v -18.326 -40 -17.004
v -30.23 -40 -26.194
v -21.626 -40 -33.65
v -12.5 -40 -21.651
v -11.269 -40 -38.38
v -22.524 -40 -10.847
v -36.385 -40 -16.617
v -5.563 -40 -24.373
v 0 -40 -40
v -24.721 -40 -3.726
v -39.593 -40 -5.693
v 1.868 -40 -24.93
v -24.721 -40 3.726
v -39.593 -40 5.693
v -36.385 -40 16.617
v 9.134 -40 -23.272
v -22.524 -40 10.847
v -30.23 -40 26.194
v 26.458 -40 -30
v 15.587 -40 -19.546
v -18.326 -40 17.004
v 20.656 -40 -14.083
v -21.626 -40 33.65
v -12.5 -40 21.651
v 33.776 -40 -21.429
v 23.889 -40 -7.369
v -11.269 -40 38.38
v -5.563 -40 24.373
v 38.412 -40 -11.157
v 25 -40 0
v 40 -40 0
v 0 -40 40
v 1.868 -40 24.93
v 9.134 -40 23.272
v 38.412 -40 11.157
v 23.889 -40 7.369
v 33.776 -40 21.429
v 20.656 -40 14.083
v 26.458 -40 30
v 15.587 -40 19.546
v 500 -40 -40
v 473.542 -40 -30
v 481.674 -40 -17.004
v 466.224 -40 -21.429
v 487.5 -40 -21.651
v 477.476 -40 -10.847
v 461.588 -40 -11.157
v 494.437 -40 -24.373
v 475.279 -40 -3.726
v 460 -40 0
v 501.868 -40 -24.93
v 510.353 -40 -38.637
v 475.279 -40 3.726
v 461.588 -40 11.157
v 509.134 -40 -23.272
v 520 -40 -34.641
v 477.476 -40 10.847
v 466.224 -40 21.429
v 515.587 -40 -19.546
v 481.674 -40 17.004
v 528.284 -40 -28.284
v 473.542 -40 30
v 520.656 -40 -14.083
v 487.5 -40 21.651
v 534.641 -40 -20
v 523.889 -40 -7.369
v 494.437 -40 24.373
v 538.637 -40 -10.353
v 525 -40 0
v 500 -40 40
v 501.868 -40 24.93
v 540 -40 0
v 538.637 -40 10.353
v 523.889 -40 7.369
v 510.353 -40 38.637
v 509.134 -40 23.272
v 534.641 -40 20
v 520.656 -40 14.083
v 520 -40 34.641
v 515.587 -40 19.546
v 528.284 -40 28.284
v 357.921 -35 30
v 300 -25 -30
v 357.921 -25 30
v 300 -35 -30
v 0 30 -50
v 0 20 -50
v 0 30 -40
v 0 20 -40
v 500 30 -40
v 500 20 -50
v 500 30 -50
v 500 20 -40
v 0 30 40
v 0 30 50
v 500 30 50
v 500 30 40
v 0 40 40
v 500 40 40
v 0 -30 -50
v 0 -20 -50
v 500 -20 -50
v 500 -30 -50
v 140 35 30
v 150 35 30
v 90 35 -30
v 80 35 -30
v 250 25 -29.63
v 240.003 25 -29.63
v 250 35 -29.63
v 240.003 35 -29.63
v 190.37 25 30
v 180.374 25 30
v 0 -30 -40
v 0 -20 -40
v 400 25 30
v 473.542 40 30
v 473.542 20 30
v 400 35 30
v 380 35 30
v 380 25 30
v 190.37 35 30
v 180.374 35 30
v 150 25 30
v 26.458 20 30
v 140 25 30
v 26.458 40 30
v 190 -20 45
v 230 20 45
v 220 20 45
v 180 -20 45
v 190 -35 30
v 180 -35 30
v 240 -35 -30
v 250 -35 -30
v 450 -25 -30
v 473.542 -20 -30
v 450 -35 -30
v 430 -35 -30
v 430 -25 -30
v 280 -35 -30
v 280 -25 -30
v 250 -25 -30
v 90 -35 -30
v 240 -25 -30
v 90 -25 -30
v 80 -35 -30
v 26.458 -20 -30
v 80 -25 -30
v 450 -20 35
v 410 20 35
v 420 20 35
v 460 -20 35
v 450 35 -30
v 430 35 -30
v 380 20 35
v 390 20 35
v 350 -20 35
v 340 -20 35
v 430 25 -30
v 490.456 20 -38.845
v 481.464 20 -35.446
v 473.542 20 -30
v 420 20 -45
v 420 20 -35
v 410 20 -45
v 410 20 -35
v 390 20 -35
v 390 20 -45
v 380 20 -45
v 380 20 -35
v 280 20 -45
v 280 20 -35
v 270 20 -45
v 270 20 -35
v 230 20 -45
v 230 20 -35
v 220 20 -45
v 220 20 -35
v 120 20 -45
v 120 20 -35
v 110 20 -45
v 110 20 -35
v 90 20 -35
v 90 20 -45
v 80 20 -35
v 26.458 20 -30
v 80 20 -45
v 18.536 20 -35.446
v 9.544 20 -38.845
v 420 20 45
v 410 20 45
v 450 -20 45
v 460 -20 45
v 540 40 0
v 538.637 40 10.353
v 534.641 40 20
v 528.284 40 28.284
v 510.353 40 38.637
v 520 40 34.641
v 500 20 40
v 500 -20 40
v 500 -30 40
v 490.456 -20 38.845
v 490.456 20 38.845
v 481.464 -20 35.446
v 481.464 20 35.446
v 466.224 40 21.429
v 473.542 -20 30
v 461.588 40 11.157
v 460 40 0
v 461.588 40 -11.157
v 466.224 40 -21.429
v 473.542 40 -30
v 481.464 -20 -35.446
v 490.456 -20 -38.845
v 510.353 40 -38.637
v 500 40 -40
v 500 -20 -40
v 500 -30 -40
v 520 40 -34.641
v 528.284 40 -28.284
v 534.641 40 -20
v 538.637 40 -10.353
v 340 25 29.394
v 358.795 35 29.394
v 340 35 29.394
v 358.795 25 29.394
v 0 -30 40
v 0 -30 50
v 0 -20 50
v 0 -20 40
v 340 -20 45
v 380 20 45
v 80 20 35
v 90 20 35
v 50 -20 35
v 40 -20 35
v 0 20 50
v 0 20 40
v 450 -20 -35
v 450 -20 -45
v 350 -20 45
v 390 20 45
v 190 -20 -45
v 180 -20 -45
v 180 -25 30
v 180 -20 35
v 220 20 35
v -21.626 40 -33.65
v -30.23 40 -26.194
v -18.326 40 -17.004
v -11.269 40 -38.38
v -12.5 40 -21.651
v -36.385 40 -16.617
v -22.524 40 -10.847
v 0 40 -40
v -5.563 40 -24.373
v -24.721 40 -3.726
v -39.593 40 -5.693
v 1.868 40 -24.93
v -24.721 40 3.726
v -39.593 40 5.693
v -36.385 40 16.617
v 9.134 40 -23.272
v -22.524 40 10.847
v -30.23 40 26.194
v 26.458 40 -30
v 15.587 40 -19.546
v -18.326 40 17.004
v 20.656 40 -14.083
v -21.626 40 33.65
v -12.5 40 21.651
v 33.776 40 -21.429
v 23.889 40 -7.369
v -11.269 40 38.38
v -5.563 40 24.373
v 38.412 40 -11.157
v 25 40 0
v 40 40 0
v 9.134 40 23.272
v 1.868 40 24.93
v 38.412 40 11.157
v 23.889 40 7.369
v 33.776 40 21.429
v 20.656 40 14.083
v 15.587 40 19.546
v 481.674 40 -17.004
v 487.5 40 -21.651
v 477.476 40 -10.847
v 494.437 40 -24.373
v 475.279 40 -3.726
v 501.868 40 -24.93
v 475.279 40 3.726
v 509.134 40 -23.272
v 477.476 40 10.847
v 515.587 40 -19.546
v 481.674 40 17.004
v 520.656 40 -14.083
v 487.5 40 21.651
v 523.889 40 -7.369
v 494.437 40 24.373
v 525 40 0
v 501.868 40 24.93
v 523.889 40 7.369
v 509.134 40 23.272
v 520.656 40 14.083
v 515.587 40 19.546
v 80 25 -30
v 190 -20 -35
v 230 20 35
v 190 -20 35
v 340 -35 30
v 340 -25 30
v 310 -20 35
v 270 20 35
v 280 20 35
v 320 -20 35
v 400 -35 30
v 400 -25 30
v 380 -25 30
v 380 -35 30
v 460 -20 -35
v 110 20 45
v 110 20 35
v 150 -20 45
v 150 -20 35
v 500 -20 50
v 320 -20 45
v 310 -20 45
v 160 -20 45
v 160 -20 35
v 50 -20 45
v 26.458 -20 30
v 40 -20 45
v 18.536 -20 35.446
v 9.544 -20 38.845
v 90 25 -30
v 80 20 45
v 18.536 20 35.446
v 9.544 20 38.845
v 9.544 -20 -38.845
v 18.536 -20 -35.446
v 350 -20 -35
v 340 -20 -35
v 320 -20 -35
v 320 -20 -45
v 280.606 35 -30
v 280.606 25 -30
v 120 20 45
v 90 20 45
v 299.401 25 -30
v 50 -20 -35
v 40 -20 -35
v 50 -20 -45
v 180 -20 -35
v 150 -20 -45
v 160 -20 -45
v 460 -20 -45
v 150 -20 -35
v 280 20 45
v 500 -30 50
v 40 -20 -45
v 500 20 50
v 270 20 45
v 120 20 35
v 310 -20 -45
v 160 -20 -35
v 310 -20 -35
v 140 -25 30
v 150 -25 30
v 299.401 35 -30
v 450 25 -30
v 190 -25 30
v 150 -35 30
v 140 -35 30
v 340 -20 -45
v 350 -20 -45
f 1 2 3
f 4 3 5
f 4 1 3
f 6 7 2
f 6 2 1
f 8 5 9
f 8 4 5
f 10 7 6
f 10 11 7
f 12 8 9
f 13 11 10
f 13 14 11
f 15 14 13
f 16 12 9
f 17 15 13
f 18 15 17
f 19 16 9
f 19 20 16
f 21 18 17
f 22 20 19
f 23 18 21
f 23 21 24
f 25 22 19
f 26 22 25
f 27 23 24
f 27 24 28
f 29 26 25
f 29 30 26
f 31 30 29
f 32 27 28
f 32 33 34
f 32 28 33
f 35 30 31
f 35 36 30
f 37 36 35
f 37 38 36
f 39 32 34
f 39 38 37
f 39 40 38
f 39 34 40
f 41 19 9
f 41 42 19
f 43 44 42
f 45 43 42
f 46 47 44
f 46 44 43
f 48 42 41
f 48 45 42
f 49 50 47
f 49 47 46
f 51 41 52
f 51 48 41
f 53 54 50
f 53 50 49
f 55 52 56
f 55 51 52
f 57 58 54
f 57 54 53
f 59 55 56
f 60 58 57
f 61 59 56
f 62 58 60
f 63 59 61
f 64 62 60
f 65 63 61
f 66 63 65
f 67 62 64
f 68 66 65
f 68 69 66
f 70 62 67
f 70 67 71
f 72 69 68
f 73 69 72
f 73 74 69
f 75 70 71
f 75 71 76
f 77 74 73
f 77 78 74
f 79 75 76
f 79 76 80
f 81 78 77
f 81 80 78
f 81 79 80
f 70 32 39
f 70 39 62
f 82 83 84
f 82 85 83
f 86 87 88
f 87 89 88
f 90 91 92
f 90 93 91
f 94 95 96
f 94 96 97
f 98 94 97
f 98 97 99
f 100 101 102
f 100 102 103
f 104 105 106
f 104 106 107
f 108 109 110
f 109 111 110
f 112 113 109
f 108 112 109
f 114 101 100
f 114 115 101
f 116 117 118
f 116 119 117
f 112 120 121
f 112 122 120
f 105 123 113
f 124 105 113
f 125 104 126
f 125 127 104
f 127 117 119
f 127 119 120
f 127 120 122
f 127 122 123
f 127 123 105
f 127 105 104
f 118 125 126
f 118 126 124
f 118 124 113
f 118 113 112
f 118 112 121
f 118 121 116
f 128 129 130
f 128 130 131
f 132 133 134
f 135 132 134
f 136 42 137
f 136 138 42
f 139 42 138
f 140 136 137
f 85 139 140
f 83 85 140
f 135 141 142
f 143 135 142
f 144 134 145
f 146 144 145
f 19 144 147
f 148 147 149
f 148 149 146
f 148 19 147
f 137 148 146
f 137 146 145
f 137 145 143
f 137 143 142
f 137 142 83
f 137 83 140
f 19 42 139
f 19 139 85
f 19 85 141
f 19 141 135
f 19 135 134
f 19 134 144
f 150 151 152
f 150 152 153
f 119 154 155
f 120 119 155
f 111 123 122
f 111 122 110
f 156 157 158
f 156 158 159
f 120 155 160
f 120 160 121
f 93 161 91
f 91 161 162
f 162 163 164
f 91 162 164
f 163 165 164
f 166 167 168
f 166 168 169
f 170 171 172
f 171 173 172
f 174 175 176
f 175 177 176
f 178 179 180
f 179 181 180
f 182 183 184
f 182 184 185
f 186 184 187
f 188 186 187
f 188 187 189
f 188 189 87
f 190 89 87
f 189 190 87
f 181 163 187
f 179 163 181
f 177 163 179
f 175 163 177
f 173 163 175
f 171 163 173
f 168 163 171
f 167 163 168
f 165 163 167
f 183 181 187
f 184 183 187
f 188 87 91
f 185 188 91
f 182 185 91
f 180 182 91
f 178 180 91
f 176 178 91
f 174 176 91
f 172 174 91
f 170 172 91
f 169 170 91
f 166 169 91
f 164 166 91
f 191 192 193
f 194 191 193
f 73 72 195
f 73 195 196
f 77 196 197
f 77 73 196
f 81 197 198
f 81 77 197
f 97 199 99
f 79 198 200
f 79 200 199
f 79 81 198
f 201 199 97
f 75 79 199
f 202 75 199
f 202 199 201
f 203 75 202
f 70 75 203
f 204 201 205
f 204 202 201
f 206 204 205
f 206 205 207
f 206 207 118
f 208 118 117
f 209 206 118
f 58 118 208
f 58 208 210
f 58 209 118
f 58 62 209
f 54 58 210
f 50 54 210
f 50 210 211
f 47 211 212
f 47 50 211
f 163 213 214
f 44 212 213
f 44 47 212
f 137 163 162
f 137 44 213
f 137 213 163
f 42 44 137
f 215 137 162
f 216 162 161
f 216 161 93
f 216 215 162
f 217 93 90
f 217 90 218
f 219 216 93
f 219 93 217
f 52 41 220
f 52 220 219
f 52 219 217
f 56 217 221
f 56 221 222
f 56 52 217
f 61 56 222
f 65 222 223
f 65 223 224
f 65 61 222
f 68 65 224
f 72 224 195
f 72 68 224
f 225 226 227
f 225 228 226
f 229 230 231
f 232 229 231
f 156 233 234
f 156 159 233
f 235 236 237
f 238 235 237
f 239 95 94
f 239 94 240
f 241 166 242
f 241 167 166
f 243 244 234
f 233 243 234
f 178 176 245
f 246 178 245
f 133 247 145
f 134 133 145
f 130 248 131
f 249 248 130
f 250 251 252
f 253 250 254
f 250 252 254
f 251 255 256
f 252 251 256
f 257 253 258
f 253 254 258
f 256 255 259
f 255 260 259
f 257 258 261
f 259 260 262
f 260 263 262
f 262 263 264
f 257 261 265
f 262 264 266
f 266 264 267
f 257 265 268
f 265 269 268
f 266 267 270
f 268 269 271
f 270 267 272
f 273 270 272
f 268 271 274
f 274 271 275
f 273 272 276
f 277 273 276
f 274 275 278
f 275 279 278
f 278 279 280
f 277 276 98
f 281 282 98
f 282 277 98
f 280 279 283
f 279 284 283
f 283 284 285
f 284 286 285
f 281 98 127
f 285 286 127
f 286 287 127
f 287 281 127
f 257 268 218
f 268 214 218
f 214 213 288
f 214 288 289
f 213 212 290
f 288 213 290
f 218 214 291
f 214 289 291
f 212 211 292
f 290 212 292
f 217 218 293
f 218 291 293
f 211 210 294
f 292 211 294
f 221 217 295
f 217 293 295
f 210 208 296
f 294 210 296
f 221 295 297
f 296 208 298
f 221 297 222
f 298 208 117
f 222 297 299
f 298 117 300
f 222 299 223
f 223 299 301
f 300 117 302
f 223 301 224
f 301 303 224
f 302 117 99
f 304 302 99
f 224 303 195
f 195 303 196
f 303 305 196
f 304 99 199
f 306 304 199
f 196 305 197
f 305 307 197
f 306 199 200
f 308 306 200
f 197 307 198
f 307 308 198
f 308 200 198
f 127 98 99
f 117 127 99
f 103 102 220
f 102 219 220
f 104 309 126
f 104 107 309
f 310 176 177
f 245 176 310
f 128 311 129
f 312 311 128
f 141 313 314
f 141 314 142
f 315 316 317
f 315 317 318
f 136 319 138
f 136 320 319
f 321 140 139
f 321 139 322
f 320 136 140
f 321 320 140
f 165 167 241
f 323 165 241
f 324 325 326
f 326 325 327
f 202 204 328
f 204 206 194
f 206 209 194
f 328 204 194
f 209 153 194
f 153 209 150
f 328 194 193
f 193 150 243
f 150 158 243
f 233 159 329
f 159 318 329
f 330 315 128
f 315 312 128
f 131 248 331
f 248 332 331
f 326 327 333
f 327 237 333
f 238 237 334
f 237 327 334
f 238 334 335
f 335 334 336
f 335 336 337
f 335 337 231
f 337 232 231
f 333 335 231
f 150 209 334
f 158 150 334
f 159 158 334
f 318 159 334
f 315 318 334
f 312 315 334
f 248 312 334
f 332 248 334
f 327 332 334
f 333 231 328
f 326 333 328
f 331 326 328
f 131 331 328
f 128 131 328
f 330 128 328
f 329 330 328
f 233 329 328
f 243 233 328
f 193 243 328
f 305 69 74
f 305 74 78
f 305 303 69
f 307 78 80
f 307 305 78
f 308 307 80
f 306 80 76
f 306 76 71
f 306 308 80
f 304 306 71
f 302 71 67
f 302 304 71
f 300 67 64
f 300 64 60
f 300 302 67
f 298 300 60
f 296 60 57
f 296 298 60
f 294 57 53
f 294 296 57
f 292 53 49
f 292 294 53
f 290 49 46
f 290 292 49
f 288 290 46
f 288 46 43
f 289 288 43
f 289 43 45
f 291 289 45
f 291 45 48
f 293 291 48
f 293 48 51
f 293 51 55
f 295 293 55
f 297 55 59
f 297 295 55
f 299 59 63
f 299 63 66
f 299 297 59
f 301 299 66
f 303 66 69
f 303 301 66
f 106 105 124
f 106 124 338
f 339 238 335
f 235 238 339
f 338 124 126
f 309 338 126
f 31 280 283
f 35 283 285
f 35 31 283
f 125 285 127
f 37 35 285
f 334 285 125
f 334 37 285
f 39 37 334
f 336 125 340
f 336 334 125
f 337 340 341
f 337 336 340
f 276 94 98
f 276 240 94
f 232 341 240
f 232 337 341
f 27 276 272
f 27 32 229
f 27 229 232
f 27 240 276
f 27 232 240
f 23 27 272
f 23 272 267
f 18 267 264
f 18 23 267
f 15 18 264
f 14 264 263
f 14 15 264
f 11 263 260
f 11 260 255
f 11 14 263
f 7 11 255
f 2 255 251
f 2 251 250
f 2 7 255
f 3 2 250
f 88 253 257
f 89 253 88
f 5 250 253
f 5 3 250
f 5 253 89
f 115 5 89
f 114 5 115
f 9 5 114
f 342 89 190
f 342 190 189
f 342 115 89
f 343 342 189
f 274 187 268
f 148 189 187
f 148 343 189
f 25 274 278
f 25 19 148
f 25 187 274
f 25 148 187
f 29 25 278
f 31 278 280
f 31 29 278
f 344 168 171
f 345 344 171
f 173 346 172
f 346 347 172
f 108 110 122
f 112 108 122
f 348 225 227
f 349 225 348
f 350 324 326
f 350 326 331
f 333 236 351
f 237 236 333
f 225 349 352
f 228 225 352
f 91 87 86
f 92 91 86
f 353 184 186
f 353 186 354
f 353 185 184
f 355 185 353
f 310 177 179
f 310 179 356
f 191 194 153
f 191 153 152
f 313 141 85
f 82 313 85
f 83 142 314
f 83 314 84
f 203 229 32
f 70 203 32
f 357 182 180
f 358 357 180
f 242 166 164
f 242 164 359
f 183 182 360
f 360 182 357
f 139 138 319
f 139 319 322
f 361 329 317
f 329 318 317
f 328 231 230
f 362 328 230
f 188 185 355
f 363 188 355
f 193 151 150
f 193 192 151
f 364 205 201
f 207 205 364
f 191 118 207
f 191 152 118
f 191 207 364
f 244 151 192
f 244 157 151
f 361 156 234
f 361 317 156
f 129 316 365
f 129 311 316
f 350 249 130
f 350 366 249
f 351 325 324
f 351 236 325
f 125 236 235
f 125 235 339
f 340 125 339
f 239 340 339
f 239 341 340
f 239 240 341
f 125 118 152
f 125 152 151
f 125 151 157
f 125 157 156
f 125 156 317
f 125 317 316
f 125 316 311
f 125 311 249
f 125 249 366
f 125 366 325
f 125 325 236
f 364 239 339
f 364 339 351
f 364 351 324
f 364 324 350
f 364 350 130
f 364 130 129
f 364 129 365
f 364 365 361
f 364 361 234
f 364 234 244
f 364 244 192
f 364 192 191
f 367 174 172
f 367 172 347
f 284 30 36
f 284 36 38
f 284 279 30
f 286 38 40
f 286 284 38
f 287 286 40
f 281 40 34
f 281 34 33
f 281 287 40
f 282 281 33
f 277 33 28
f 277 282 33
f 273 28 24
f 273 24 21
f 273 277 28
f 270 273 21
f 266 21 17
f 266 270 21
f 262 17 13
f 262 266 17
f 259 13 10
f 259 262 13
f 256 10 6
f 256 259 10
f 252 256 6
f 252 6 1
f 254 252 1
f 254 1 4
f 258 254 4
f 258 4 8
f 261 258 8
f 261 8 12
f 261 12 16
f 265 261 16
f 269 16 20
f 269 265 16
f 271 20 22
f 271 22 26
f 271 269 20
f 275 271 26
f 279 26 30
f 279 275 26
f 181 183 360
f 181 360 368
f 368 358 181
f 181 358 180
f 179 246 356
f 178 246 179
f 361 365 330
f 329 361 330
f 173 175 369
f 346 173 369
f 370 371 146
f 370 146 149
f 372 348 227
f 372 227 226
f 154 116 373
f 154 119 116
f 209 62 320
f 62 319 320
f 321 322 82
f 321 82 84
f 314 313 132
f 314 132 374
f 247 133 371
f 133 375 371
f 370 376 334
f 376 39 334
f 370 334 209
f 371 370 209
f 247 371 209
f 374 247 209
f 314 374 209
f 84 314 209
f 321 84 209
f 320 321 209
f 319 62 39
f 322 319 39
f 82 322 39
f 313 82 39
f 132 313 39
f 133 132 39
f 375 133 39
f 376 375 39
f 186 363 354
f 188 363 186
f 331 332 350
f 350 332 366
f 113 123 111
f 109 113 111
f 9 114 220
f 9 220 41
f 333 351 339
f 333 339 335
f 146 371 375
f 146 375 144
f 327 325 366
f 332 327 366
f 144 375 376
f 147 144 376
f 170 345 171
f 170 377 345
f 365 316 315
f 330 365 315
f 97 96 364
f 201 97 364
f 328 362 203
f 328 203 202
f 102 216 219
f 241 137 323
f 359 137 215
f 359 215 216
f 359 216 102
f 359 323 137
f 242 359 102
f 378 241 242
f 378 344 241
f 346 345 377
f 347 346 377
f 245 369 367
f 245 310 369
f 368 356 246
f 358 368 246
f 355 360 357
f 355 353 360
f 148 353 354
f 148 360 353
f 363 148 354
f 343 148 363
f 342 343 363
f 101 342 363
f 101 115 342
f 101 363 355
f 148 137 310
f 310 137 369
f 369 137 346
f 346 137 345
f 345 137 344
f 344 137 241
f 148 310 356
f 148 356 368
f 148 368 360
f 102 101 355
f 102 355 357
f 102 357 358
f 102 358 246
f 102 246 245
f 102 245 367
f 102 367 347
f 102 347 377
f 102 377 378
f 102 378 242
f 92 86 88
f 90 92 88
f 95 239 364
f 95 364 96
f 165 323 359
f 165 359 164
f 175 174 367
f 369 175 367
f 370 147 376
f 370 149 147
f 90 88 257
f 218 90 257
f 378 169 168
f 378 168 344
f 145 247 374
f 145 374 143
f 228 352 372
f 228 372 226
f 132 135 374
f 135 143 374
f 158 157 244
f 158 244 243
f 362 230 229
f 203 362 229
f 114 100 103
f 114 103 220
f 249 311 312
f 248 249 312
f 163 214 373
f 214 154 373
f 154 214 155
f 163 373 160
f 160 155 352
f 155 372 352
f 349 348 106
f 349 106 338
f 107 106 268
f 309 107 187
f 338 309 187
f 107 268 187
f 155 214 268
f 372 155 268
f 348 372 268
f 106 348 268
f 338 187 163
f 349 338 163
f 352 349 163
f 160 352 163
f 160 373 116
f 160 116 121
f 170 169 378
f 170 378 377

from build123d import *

# Parameters (mm, degrees)
SKETCH_R      = 40
SKETCH_R_2    = 25
PAD_DEPTH     = 40
PAD001_DEPTH  = 500
SKETCH002_R   = 40
SKETCH002_R_2 = 25
PAD002_DEPTH  = 40
PAD003_DEPTH  = 5
PAD004_DEPTH  = 5
PAD005_DEPTH  = 5
PAD006_DEPTH  = 5


with BuildPart() as part:
    # Sketch → Pad (new body, symmetric)
    with BuildSketch(Plane.XZ):
        Circle(SKETCH_R)
        Circle(SKETCH_R_2, mode=Mode.SUBTRACT)
    extrude(amount=PAD_DEPTH, both=True)

    # Sketch001 → Pad001 (join)
    with BuildSketch(Plane.YZ):
        Polygon((-30, 50), (-30, 40), (-40, 40), (-40, 30), (-20, 30), (-20, 50), align=None)
        Polygon((30, 50), (30, 40), (40, 40), (40, 30), (20, 30), (20, 50), align=None)
        Polygon((-30, -50), (-30, -40), (-40, -40), (-40, -30), (-20, -30), (-20, -50), align=None)
        Polygon((30, -50), (30, -40), (40, -40), (40, -30), (20, -30), (20, -50), align=None)
    extrude(amount=PAD001_DEPTH)

    # Sketch002 → Pad002 (join, symmetric)
    with BuildSketch(Plane(origin=(500, 0, 0), x_dir=(1, 0, 0), z_dir=(0, -1, 0))):
        Circle(SKETCH002_R)
        Circle(SKETCH002_R_2, mode=Mode.SUBTRACT)
    extrude(amount=PAD002_DEPTH, both=True)

    # Sketch004 → Pad003 (join, symmetric)
    with BuildSketch(Plane.XZ.offset(-30)):
        Polygon((80, -30), (140, 30), (150, 30), (90, -30), align=None)
        Polygon((450, -30), (430, -30), (380, 30), (400, 30), align=None)
        Polygon((180.003479, 30.370306), (240.003479, -29.629694), (250, -29.629694), (190, 30.370306), align=None)
        Polygon((358.794617, 29.393638), (340, 29.393638), (280, -30.606362), (298.794617, -30.606362), align=None)
    extrude(amount=PAD003_DEPTH, both=True)

    # Sketch003 → Pad004 (join, symmetric)
    with BuildSketch(Plane.XZ.offset(30)):
        Polygon((80, -30), (140, 30), (150, 30), (90, -30), align=None)
        Polygon((450, -30), (430, -30), (380, 30), (400, 30), align=None)
        Polygon((180, 30), (240, -30), (250, -30), (190, 30), align=None)
        Polygon((357.920776, 30), (340, 30), (280, -30), (300, -30), align=None)
    extrude(amount=PAD004_DEPTH, both=True)

    # Sketch006 → Pad005 (join, symmetric)
    with BuildSketch(Plane.XY.offset(-40)):
        Polygon((230, 20), (190, -20), (180, -20), (220, 20), align=None)
        Polygon((160, -20), (120, 20), (110, 20), (150, -20), align=None)
        Polygon((90, 20), (50, -20), (40, -20), (80, 20), align=None)
        Polygon((270, 20), (310, -20), (320, -20), (280, 20), align=None)
        Polygon((340, -20), (380, 20), (390, 20), (350, -20), align=None)
        Polygon((410, 20), (450, -20), (460, -20), (420, 20), align=None)
    extrude(amount=PAD005_DEPTH, both=True)

    # Sketch005 → Pad006 (join, symmetric)
    with BuildSketch(Plane.XY.offset(40)):
        Polygon((230, 20), (190, -20), (180, -20), (220, 20), align=None)
        Polygon((160, -20), (120, 20), (110, 20), (150, -20), align=None)
        Polygon((90, 20), (50, -20), (40, -20), (80, 20), align=None)
        Polygon((270, 20), (310, -20), (320, -20), (280, 20), align=None)
        Polygon((340, -20), (380, 20), (390, 20), (350, -20), align=None)
        Polygon((410, 20), (450, -20), (460, -20), (420, 20), align=None)
    extrude(amount=PAD006_DEPTH, both=True)


solid = part.part
